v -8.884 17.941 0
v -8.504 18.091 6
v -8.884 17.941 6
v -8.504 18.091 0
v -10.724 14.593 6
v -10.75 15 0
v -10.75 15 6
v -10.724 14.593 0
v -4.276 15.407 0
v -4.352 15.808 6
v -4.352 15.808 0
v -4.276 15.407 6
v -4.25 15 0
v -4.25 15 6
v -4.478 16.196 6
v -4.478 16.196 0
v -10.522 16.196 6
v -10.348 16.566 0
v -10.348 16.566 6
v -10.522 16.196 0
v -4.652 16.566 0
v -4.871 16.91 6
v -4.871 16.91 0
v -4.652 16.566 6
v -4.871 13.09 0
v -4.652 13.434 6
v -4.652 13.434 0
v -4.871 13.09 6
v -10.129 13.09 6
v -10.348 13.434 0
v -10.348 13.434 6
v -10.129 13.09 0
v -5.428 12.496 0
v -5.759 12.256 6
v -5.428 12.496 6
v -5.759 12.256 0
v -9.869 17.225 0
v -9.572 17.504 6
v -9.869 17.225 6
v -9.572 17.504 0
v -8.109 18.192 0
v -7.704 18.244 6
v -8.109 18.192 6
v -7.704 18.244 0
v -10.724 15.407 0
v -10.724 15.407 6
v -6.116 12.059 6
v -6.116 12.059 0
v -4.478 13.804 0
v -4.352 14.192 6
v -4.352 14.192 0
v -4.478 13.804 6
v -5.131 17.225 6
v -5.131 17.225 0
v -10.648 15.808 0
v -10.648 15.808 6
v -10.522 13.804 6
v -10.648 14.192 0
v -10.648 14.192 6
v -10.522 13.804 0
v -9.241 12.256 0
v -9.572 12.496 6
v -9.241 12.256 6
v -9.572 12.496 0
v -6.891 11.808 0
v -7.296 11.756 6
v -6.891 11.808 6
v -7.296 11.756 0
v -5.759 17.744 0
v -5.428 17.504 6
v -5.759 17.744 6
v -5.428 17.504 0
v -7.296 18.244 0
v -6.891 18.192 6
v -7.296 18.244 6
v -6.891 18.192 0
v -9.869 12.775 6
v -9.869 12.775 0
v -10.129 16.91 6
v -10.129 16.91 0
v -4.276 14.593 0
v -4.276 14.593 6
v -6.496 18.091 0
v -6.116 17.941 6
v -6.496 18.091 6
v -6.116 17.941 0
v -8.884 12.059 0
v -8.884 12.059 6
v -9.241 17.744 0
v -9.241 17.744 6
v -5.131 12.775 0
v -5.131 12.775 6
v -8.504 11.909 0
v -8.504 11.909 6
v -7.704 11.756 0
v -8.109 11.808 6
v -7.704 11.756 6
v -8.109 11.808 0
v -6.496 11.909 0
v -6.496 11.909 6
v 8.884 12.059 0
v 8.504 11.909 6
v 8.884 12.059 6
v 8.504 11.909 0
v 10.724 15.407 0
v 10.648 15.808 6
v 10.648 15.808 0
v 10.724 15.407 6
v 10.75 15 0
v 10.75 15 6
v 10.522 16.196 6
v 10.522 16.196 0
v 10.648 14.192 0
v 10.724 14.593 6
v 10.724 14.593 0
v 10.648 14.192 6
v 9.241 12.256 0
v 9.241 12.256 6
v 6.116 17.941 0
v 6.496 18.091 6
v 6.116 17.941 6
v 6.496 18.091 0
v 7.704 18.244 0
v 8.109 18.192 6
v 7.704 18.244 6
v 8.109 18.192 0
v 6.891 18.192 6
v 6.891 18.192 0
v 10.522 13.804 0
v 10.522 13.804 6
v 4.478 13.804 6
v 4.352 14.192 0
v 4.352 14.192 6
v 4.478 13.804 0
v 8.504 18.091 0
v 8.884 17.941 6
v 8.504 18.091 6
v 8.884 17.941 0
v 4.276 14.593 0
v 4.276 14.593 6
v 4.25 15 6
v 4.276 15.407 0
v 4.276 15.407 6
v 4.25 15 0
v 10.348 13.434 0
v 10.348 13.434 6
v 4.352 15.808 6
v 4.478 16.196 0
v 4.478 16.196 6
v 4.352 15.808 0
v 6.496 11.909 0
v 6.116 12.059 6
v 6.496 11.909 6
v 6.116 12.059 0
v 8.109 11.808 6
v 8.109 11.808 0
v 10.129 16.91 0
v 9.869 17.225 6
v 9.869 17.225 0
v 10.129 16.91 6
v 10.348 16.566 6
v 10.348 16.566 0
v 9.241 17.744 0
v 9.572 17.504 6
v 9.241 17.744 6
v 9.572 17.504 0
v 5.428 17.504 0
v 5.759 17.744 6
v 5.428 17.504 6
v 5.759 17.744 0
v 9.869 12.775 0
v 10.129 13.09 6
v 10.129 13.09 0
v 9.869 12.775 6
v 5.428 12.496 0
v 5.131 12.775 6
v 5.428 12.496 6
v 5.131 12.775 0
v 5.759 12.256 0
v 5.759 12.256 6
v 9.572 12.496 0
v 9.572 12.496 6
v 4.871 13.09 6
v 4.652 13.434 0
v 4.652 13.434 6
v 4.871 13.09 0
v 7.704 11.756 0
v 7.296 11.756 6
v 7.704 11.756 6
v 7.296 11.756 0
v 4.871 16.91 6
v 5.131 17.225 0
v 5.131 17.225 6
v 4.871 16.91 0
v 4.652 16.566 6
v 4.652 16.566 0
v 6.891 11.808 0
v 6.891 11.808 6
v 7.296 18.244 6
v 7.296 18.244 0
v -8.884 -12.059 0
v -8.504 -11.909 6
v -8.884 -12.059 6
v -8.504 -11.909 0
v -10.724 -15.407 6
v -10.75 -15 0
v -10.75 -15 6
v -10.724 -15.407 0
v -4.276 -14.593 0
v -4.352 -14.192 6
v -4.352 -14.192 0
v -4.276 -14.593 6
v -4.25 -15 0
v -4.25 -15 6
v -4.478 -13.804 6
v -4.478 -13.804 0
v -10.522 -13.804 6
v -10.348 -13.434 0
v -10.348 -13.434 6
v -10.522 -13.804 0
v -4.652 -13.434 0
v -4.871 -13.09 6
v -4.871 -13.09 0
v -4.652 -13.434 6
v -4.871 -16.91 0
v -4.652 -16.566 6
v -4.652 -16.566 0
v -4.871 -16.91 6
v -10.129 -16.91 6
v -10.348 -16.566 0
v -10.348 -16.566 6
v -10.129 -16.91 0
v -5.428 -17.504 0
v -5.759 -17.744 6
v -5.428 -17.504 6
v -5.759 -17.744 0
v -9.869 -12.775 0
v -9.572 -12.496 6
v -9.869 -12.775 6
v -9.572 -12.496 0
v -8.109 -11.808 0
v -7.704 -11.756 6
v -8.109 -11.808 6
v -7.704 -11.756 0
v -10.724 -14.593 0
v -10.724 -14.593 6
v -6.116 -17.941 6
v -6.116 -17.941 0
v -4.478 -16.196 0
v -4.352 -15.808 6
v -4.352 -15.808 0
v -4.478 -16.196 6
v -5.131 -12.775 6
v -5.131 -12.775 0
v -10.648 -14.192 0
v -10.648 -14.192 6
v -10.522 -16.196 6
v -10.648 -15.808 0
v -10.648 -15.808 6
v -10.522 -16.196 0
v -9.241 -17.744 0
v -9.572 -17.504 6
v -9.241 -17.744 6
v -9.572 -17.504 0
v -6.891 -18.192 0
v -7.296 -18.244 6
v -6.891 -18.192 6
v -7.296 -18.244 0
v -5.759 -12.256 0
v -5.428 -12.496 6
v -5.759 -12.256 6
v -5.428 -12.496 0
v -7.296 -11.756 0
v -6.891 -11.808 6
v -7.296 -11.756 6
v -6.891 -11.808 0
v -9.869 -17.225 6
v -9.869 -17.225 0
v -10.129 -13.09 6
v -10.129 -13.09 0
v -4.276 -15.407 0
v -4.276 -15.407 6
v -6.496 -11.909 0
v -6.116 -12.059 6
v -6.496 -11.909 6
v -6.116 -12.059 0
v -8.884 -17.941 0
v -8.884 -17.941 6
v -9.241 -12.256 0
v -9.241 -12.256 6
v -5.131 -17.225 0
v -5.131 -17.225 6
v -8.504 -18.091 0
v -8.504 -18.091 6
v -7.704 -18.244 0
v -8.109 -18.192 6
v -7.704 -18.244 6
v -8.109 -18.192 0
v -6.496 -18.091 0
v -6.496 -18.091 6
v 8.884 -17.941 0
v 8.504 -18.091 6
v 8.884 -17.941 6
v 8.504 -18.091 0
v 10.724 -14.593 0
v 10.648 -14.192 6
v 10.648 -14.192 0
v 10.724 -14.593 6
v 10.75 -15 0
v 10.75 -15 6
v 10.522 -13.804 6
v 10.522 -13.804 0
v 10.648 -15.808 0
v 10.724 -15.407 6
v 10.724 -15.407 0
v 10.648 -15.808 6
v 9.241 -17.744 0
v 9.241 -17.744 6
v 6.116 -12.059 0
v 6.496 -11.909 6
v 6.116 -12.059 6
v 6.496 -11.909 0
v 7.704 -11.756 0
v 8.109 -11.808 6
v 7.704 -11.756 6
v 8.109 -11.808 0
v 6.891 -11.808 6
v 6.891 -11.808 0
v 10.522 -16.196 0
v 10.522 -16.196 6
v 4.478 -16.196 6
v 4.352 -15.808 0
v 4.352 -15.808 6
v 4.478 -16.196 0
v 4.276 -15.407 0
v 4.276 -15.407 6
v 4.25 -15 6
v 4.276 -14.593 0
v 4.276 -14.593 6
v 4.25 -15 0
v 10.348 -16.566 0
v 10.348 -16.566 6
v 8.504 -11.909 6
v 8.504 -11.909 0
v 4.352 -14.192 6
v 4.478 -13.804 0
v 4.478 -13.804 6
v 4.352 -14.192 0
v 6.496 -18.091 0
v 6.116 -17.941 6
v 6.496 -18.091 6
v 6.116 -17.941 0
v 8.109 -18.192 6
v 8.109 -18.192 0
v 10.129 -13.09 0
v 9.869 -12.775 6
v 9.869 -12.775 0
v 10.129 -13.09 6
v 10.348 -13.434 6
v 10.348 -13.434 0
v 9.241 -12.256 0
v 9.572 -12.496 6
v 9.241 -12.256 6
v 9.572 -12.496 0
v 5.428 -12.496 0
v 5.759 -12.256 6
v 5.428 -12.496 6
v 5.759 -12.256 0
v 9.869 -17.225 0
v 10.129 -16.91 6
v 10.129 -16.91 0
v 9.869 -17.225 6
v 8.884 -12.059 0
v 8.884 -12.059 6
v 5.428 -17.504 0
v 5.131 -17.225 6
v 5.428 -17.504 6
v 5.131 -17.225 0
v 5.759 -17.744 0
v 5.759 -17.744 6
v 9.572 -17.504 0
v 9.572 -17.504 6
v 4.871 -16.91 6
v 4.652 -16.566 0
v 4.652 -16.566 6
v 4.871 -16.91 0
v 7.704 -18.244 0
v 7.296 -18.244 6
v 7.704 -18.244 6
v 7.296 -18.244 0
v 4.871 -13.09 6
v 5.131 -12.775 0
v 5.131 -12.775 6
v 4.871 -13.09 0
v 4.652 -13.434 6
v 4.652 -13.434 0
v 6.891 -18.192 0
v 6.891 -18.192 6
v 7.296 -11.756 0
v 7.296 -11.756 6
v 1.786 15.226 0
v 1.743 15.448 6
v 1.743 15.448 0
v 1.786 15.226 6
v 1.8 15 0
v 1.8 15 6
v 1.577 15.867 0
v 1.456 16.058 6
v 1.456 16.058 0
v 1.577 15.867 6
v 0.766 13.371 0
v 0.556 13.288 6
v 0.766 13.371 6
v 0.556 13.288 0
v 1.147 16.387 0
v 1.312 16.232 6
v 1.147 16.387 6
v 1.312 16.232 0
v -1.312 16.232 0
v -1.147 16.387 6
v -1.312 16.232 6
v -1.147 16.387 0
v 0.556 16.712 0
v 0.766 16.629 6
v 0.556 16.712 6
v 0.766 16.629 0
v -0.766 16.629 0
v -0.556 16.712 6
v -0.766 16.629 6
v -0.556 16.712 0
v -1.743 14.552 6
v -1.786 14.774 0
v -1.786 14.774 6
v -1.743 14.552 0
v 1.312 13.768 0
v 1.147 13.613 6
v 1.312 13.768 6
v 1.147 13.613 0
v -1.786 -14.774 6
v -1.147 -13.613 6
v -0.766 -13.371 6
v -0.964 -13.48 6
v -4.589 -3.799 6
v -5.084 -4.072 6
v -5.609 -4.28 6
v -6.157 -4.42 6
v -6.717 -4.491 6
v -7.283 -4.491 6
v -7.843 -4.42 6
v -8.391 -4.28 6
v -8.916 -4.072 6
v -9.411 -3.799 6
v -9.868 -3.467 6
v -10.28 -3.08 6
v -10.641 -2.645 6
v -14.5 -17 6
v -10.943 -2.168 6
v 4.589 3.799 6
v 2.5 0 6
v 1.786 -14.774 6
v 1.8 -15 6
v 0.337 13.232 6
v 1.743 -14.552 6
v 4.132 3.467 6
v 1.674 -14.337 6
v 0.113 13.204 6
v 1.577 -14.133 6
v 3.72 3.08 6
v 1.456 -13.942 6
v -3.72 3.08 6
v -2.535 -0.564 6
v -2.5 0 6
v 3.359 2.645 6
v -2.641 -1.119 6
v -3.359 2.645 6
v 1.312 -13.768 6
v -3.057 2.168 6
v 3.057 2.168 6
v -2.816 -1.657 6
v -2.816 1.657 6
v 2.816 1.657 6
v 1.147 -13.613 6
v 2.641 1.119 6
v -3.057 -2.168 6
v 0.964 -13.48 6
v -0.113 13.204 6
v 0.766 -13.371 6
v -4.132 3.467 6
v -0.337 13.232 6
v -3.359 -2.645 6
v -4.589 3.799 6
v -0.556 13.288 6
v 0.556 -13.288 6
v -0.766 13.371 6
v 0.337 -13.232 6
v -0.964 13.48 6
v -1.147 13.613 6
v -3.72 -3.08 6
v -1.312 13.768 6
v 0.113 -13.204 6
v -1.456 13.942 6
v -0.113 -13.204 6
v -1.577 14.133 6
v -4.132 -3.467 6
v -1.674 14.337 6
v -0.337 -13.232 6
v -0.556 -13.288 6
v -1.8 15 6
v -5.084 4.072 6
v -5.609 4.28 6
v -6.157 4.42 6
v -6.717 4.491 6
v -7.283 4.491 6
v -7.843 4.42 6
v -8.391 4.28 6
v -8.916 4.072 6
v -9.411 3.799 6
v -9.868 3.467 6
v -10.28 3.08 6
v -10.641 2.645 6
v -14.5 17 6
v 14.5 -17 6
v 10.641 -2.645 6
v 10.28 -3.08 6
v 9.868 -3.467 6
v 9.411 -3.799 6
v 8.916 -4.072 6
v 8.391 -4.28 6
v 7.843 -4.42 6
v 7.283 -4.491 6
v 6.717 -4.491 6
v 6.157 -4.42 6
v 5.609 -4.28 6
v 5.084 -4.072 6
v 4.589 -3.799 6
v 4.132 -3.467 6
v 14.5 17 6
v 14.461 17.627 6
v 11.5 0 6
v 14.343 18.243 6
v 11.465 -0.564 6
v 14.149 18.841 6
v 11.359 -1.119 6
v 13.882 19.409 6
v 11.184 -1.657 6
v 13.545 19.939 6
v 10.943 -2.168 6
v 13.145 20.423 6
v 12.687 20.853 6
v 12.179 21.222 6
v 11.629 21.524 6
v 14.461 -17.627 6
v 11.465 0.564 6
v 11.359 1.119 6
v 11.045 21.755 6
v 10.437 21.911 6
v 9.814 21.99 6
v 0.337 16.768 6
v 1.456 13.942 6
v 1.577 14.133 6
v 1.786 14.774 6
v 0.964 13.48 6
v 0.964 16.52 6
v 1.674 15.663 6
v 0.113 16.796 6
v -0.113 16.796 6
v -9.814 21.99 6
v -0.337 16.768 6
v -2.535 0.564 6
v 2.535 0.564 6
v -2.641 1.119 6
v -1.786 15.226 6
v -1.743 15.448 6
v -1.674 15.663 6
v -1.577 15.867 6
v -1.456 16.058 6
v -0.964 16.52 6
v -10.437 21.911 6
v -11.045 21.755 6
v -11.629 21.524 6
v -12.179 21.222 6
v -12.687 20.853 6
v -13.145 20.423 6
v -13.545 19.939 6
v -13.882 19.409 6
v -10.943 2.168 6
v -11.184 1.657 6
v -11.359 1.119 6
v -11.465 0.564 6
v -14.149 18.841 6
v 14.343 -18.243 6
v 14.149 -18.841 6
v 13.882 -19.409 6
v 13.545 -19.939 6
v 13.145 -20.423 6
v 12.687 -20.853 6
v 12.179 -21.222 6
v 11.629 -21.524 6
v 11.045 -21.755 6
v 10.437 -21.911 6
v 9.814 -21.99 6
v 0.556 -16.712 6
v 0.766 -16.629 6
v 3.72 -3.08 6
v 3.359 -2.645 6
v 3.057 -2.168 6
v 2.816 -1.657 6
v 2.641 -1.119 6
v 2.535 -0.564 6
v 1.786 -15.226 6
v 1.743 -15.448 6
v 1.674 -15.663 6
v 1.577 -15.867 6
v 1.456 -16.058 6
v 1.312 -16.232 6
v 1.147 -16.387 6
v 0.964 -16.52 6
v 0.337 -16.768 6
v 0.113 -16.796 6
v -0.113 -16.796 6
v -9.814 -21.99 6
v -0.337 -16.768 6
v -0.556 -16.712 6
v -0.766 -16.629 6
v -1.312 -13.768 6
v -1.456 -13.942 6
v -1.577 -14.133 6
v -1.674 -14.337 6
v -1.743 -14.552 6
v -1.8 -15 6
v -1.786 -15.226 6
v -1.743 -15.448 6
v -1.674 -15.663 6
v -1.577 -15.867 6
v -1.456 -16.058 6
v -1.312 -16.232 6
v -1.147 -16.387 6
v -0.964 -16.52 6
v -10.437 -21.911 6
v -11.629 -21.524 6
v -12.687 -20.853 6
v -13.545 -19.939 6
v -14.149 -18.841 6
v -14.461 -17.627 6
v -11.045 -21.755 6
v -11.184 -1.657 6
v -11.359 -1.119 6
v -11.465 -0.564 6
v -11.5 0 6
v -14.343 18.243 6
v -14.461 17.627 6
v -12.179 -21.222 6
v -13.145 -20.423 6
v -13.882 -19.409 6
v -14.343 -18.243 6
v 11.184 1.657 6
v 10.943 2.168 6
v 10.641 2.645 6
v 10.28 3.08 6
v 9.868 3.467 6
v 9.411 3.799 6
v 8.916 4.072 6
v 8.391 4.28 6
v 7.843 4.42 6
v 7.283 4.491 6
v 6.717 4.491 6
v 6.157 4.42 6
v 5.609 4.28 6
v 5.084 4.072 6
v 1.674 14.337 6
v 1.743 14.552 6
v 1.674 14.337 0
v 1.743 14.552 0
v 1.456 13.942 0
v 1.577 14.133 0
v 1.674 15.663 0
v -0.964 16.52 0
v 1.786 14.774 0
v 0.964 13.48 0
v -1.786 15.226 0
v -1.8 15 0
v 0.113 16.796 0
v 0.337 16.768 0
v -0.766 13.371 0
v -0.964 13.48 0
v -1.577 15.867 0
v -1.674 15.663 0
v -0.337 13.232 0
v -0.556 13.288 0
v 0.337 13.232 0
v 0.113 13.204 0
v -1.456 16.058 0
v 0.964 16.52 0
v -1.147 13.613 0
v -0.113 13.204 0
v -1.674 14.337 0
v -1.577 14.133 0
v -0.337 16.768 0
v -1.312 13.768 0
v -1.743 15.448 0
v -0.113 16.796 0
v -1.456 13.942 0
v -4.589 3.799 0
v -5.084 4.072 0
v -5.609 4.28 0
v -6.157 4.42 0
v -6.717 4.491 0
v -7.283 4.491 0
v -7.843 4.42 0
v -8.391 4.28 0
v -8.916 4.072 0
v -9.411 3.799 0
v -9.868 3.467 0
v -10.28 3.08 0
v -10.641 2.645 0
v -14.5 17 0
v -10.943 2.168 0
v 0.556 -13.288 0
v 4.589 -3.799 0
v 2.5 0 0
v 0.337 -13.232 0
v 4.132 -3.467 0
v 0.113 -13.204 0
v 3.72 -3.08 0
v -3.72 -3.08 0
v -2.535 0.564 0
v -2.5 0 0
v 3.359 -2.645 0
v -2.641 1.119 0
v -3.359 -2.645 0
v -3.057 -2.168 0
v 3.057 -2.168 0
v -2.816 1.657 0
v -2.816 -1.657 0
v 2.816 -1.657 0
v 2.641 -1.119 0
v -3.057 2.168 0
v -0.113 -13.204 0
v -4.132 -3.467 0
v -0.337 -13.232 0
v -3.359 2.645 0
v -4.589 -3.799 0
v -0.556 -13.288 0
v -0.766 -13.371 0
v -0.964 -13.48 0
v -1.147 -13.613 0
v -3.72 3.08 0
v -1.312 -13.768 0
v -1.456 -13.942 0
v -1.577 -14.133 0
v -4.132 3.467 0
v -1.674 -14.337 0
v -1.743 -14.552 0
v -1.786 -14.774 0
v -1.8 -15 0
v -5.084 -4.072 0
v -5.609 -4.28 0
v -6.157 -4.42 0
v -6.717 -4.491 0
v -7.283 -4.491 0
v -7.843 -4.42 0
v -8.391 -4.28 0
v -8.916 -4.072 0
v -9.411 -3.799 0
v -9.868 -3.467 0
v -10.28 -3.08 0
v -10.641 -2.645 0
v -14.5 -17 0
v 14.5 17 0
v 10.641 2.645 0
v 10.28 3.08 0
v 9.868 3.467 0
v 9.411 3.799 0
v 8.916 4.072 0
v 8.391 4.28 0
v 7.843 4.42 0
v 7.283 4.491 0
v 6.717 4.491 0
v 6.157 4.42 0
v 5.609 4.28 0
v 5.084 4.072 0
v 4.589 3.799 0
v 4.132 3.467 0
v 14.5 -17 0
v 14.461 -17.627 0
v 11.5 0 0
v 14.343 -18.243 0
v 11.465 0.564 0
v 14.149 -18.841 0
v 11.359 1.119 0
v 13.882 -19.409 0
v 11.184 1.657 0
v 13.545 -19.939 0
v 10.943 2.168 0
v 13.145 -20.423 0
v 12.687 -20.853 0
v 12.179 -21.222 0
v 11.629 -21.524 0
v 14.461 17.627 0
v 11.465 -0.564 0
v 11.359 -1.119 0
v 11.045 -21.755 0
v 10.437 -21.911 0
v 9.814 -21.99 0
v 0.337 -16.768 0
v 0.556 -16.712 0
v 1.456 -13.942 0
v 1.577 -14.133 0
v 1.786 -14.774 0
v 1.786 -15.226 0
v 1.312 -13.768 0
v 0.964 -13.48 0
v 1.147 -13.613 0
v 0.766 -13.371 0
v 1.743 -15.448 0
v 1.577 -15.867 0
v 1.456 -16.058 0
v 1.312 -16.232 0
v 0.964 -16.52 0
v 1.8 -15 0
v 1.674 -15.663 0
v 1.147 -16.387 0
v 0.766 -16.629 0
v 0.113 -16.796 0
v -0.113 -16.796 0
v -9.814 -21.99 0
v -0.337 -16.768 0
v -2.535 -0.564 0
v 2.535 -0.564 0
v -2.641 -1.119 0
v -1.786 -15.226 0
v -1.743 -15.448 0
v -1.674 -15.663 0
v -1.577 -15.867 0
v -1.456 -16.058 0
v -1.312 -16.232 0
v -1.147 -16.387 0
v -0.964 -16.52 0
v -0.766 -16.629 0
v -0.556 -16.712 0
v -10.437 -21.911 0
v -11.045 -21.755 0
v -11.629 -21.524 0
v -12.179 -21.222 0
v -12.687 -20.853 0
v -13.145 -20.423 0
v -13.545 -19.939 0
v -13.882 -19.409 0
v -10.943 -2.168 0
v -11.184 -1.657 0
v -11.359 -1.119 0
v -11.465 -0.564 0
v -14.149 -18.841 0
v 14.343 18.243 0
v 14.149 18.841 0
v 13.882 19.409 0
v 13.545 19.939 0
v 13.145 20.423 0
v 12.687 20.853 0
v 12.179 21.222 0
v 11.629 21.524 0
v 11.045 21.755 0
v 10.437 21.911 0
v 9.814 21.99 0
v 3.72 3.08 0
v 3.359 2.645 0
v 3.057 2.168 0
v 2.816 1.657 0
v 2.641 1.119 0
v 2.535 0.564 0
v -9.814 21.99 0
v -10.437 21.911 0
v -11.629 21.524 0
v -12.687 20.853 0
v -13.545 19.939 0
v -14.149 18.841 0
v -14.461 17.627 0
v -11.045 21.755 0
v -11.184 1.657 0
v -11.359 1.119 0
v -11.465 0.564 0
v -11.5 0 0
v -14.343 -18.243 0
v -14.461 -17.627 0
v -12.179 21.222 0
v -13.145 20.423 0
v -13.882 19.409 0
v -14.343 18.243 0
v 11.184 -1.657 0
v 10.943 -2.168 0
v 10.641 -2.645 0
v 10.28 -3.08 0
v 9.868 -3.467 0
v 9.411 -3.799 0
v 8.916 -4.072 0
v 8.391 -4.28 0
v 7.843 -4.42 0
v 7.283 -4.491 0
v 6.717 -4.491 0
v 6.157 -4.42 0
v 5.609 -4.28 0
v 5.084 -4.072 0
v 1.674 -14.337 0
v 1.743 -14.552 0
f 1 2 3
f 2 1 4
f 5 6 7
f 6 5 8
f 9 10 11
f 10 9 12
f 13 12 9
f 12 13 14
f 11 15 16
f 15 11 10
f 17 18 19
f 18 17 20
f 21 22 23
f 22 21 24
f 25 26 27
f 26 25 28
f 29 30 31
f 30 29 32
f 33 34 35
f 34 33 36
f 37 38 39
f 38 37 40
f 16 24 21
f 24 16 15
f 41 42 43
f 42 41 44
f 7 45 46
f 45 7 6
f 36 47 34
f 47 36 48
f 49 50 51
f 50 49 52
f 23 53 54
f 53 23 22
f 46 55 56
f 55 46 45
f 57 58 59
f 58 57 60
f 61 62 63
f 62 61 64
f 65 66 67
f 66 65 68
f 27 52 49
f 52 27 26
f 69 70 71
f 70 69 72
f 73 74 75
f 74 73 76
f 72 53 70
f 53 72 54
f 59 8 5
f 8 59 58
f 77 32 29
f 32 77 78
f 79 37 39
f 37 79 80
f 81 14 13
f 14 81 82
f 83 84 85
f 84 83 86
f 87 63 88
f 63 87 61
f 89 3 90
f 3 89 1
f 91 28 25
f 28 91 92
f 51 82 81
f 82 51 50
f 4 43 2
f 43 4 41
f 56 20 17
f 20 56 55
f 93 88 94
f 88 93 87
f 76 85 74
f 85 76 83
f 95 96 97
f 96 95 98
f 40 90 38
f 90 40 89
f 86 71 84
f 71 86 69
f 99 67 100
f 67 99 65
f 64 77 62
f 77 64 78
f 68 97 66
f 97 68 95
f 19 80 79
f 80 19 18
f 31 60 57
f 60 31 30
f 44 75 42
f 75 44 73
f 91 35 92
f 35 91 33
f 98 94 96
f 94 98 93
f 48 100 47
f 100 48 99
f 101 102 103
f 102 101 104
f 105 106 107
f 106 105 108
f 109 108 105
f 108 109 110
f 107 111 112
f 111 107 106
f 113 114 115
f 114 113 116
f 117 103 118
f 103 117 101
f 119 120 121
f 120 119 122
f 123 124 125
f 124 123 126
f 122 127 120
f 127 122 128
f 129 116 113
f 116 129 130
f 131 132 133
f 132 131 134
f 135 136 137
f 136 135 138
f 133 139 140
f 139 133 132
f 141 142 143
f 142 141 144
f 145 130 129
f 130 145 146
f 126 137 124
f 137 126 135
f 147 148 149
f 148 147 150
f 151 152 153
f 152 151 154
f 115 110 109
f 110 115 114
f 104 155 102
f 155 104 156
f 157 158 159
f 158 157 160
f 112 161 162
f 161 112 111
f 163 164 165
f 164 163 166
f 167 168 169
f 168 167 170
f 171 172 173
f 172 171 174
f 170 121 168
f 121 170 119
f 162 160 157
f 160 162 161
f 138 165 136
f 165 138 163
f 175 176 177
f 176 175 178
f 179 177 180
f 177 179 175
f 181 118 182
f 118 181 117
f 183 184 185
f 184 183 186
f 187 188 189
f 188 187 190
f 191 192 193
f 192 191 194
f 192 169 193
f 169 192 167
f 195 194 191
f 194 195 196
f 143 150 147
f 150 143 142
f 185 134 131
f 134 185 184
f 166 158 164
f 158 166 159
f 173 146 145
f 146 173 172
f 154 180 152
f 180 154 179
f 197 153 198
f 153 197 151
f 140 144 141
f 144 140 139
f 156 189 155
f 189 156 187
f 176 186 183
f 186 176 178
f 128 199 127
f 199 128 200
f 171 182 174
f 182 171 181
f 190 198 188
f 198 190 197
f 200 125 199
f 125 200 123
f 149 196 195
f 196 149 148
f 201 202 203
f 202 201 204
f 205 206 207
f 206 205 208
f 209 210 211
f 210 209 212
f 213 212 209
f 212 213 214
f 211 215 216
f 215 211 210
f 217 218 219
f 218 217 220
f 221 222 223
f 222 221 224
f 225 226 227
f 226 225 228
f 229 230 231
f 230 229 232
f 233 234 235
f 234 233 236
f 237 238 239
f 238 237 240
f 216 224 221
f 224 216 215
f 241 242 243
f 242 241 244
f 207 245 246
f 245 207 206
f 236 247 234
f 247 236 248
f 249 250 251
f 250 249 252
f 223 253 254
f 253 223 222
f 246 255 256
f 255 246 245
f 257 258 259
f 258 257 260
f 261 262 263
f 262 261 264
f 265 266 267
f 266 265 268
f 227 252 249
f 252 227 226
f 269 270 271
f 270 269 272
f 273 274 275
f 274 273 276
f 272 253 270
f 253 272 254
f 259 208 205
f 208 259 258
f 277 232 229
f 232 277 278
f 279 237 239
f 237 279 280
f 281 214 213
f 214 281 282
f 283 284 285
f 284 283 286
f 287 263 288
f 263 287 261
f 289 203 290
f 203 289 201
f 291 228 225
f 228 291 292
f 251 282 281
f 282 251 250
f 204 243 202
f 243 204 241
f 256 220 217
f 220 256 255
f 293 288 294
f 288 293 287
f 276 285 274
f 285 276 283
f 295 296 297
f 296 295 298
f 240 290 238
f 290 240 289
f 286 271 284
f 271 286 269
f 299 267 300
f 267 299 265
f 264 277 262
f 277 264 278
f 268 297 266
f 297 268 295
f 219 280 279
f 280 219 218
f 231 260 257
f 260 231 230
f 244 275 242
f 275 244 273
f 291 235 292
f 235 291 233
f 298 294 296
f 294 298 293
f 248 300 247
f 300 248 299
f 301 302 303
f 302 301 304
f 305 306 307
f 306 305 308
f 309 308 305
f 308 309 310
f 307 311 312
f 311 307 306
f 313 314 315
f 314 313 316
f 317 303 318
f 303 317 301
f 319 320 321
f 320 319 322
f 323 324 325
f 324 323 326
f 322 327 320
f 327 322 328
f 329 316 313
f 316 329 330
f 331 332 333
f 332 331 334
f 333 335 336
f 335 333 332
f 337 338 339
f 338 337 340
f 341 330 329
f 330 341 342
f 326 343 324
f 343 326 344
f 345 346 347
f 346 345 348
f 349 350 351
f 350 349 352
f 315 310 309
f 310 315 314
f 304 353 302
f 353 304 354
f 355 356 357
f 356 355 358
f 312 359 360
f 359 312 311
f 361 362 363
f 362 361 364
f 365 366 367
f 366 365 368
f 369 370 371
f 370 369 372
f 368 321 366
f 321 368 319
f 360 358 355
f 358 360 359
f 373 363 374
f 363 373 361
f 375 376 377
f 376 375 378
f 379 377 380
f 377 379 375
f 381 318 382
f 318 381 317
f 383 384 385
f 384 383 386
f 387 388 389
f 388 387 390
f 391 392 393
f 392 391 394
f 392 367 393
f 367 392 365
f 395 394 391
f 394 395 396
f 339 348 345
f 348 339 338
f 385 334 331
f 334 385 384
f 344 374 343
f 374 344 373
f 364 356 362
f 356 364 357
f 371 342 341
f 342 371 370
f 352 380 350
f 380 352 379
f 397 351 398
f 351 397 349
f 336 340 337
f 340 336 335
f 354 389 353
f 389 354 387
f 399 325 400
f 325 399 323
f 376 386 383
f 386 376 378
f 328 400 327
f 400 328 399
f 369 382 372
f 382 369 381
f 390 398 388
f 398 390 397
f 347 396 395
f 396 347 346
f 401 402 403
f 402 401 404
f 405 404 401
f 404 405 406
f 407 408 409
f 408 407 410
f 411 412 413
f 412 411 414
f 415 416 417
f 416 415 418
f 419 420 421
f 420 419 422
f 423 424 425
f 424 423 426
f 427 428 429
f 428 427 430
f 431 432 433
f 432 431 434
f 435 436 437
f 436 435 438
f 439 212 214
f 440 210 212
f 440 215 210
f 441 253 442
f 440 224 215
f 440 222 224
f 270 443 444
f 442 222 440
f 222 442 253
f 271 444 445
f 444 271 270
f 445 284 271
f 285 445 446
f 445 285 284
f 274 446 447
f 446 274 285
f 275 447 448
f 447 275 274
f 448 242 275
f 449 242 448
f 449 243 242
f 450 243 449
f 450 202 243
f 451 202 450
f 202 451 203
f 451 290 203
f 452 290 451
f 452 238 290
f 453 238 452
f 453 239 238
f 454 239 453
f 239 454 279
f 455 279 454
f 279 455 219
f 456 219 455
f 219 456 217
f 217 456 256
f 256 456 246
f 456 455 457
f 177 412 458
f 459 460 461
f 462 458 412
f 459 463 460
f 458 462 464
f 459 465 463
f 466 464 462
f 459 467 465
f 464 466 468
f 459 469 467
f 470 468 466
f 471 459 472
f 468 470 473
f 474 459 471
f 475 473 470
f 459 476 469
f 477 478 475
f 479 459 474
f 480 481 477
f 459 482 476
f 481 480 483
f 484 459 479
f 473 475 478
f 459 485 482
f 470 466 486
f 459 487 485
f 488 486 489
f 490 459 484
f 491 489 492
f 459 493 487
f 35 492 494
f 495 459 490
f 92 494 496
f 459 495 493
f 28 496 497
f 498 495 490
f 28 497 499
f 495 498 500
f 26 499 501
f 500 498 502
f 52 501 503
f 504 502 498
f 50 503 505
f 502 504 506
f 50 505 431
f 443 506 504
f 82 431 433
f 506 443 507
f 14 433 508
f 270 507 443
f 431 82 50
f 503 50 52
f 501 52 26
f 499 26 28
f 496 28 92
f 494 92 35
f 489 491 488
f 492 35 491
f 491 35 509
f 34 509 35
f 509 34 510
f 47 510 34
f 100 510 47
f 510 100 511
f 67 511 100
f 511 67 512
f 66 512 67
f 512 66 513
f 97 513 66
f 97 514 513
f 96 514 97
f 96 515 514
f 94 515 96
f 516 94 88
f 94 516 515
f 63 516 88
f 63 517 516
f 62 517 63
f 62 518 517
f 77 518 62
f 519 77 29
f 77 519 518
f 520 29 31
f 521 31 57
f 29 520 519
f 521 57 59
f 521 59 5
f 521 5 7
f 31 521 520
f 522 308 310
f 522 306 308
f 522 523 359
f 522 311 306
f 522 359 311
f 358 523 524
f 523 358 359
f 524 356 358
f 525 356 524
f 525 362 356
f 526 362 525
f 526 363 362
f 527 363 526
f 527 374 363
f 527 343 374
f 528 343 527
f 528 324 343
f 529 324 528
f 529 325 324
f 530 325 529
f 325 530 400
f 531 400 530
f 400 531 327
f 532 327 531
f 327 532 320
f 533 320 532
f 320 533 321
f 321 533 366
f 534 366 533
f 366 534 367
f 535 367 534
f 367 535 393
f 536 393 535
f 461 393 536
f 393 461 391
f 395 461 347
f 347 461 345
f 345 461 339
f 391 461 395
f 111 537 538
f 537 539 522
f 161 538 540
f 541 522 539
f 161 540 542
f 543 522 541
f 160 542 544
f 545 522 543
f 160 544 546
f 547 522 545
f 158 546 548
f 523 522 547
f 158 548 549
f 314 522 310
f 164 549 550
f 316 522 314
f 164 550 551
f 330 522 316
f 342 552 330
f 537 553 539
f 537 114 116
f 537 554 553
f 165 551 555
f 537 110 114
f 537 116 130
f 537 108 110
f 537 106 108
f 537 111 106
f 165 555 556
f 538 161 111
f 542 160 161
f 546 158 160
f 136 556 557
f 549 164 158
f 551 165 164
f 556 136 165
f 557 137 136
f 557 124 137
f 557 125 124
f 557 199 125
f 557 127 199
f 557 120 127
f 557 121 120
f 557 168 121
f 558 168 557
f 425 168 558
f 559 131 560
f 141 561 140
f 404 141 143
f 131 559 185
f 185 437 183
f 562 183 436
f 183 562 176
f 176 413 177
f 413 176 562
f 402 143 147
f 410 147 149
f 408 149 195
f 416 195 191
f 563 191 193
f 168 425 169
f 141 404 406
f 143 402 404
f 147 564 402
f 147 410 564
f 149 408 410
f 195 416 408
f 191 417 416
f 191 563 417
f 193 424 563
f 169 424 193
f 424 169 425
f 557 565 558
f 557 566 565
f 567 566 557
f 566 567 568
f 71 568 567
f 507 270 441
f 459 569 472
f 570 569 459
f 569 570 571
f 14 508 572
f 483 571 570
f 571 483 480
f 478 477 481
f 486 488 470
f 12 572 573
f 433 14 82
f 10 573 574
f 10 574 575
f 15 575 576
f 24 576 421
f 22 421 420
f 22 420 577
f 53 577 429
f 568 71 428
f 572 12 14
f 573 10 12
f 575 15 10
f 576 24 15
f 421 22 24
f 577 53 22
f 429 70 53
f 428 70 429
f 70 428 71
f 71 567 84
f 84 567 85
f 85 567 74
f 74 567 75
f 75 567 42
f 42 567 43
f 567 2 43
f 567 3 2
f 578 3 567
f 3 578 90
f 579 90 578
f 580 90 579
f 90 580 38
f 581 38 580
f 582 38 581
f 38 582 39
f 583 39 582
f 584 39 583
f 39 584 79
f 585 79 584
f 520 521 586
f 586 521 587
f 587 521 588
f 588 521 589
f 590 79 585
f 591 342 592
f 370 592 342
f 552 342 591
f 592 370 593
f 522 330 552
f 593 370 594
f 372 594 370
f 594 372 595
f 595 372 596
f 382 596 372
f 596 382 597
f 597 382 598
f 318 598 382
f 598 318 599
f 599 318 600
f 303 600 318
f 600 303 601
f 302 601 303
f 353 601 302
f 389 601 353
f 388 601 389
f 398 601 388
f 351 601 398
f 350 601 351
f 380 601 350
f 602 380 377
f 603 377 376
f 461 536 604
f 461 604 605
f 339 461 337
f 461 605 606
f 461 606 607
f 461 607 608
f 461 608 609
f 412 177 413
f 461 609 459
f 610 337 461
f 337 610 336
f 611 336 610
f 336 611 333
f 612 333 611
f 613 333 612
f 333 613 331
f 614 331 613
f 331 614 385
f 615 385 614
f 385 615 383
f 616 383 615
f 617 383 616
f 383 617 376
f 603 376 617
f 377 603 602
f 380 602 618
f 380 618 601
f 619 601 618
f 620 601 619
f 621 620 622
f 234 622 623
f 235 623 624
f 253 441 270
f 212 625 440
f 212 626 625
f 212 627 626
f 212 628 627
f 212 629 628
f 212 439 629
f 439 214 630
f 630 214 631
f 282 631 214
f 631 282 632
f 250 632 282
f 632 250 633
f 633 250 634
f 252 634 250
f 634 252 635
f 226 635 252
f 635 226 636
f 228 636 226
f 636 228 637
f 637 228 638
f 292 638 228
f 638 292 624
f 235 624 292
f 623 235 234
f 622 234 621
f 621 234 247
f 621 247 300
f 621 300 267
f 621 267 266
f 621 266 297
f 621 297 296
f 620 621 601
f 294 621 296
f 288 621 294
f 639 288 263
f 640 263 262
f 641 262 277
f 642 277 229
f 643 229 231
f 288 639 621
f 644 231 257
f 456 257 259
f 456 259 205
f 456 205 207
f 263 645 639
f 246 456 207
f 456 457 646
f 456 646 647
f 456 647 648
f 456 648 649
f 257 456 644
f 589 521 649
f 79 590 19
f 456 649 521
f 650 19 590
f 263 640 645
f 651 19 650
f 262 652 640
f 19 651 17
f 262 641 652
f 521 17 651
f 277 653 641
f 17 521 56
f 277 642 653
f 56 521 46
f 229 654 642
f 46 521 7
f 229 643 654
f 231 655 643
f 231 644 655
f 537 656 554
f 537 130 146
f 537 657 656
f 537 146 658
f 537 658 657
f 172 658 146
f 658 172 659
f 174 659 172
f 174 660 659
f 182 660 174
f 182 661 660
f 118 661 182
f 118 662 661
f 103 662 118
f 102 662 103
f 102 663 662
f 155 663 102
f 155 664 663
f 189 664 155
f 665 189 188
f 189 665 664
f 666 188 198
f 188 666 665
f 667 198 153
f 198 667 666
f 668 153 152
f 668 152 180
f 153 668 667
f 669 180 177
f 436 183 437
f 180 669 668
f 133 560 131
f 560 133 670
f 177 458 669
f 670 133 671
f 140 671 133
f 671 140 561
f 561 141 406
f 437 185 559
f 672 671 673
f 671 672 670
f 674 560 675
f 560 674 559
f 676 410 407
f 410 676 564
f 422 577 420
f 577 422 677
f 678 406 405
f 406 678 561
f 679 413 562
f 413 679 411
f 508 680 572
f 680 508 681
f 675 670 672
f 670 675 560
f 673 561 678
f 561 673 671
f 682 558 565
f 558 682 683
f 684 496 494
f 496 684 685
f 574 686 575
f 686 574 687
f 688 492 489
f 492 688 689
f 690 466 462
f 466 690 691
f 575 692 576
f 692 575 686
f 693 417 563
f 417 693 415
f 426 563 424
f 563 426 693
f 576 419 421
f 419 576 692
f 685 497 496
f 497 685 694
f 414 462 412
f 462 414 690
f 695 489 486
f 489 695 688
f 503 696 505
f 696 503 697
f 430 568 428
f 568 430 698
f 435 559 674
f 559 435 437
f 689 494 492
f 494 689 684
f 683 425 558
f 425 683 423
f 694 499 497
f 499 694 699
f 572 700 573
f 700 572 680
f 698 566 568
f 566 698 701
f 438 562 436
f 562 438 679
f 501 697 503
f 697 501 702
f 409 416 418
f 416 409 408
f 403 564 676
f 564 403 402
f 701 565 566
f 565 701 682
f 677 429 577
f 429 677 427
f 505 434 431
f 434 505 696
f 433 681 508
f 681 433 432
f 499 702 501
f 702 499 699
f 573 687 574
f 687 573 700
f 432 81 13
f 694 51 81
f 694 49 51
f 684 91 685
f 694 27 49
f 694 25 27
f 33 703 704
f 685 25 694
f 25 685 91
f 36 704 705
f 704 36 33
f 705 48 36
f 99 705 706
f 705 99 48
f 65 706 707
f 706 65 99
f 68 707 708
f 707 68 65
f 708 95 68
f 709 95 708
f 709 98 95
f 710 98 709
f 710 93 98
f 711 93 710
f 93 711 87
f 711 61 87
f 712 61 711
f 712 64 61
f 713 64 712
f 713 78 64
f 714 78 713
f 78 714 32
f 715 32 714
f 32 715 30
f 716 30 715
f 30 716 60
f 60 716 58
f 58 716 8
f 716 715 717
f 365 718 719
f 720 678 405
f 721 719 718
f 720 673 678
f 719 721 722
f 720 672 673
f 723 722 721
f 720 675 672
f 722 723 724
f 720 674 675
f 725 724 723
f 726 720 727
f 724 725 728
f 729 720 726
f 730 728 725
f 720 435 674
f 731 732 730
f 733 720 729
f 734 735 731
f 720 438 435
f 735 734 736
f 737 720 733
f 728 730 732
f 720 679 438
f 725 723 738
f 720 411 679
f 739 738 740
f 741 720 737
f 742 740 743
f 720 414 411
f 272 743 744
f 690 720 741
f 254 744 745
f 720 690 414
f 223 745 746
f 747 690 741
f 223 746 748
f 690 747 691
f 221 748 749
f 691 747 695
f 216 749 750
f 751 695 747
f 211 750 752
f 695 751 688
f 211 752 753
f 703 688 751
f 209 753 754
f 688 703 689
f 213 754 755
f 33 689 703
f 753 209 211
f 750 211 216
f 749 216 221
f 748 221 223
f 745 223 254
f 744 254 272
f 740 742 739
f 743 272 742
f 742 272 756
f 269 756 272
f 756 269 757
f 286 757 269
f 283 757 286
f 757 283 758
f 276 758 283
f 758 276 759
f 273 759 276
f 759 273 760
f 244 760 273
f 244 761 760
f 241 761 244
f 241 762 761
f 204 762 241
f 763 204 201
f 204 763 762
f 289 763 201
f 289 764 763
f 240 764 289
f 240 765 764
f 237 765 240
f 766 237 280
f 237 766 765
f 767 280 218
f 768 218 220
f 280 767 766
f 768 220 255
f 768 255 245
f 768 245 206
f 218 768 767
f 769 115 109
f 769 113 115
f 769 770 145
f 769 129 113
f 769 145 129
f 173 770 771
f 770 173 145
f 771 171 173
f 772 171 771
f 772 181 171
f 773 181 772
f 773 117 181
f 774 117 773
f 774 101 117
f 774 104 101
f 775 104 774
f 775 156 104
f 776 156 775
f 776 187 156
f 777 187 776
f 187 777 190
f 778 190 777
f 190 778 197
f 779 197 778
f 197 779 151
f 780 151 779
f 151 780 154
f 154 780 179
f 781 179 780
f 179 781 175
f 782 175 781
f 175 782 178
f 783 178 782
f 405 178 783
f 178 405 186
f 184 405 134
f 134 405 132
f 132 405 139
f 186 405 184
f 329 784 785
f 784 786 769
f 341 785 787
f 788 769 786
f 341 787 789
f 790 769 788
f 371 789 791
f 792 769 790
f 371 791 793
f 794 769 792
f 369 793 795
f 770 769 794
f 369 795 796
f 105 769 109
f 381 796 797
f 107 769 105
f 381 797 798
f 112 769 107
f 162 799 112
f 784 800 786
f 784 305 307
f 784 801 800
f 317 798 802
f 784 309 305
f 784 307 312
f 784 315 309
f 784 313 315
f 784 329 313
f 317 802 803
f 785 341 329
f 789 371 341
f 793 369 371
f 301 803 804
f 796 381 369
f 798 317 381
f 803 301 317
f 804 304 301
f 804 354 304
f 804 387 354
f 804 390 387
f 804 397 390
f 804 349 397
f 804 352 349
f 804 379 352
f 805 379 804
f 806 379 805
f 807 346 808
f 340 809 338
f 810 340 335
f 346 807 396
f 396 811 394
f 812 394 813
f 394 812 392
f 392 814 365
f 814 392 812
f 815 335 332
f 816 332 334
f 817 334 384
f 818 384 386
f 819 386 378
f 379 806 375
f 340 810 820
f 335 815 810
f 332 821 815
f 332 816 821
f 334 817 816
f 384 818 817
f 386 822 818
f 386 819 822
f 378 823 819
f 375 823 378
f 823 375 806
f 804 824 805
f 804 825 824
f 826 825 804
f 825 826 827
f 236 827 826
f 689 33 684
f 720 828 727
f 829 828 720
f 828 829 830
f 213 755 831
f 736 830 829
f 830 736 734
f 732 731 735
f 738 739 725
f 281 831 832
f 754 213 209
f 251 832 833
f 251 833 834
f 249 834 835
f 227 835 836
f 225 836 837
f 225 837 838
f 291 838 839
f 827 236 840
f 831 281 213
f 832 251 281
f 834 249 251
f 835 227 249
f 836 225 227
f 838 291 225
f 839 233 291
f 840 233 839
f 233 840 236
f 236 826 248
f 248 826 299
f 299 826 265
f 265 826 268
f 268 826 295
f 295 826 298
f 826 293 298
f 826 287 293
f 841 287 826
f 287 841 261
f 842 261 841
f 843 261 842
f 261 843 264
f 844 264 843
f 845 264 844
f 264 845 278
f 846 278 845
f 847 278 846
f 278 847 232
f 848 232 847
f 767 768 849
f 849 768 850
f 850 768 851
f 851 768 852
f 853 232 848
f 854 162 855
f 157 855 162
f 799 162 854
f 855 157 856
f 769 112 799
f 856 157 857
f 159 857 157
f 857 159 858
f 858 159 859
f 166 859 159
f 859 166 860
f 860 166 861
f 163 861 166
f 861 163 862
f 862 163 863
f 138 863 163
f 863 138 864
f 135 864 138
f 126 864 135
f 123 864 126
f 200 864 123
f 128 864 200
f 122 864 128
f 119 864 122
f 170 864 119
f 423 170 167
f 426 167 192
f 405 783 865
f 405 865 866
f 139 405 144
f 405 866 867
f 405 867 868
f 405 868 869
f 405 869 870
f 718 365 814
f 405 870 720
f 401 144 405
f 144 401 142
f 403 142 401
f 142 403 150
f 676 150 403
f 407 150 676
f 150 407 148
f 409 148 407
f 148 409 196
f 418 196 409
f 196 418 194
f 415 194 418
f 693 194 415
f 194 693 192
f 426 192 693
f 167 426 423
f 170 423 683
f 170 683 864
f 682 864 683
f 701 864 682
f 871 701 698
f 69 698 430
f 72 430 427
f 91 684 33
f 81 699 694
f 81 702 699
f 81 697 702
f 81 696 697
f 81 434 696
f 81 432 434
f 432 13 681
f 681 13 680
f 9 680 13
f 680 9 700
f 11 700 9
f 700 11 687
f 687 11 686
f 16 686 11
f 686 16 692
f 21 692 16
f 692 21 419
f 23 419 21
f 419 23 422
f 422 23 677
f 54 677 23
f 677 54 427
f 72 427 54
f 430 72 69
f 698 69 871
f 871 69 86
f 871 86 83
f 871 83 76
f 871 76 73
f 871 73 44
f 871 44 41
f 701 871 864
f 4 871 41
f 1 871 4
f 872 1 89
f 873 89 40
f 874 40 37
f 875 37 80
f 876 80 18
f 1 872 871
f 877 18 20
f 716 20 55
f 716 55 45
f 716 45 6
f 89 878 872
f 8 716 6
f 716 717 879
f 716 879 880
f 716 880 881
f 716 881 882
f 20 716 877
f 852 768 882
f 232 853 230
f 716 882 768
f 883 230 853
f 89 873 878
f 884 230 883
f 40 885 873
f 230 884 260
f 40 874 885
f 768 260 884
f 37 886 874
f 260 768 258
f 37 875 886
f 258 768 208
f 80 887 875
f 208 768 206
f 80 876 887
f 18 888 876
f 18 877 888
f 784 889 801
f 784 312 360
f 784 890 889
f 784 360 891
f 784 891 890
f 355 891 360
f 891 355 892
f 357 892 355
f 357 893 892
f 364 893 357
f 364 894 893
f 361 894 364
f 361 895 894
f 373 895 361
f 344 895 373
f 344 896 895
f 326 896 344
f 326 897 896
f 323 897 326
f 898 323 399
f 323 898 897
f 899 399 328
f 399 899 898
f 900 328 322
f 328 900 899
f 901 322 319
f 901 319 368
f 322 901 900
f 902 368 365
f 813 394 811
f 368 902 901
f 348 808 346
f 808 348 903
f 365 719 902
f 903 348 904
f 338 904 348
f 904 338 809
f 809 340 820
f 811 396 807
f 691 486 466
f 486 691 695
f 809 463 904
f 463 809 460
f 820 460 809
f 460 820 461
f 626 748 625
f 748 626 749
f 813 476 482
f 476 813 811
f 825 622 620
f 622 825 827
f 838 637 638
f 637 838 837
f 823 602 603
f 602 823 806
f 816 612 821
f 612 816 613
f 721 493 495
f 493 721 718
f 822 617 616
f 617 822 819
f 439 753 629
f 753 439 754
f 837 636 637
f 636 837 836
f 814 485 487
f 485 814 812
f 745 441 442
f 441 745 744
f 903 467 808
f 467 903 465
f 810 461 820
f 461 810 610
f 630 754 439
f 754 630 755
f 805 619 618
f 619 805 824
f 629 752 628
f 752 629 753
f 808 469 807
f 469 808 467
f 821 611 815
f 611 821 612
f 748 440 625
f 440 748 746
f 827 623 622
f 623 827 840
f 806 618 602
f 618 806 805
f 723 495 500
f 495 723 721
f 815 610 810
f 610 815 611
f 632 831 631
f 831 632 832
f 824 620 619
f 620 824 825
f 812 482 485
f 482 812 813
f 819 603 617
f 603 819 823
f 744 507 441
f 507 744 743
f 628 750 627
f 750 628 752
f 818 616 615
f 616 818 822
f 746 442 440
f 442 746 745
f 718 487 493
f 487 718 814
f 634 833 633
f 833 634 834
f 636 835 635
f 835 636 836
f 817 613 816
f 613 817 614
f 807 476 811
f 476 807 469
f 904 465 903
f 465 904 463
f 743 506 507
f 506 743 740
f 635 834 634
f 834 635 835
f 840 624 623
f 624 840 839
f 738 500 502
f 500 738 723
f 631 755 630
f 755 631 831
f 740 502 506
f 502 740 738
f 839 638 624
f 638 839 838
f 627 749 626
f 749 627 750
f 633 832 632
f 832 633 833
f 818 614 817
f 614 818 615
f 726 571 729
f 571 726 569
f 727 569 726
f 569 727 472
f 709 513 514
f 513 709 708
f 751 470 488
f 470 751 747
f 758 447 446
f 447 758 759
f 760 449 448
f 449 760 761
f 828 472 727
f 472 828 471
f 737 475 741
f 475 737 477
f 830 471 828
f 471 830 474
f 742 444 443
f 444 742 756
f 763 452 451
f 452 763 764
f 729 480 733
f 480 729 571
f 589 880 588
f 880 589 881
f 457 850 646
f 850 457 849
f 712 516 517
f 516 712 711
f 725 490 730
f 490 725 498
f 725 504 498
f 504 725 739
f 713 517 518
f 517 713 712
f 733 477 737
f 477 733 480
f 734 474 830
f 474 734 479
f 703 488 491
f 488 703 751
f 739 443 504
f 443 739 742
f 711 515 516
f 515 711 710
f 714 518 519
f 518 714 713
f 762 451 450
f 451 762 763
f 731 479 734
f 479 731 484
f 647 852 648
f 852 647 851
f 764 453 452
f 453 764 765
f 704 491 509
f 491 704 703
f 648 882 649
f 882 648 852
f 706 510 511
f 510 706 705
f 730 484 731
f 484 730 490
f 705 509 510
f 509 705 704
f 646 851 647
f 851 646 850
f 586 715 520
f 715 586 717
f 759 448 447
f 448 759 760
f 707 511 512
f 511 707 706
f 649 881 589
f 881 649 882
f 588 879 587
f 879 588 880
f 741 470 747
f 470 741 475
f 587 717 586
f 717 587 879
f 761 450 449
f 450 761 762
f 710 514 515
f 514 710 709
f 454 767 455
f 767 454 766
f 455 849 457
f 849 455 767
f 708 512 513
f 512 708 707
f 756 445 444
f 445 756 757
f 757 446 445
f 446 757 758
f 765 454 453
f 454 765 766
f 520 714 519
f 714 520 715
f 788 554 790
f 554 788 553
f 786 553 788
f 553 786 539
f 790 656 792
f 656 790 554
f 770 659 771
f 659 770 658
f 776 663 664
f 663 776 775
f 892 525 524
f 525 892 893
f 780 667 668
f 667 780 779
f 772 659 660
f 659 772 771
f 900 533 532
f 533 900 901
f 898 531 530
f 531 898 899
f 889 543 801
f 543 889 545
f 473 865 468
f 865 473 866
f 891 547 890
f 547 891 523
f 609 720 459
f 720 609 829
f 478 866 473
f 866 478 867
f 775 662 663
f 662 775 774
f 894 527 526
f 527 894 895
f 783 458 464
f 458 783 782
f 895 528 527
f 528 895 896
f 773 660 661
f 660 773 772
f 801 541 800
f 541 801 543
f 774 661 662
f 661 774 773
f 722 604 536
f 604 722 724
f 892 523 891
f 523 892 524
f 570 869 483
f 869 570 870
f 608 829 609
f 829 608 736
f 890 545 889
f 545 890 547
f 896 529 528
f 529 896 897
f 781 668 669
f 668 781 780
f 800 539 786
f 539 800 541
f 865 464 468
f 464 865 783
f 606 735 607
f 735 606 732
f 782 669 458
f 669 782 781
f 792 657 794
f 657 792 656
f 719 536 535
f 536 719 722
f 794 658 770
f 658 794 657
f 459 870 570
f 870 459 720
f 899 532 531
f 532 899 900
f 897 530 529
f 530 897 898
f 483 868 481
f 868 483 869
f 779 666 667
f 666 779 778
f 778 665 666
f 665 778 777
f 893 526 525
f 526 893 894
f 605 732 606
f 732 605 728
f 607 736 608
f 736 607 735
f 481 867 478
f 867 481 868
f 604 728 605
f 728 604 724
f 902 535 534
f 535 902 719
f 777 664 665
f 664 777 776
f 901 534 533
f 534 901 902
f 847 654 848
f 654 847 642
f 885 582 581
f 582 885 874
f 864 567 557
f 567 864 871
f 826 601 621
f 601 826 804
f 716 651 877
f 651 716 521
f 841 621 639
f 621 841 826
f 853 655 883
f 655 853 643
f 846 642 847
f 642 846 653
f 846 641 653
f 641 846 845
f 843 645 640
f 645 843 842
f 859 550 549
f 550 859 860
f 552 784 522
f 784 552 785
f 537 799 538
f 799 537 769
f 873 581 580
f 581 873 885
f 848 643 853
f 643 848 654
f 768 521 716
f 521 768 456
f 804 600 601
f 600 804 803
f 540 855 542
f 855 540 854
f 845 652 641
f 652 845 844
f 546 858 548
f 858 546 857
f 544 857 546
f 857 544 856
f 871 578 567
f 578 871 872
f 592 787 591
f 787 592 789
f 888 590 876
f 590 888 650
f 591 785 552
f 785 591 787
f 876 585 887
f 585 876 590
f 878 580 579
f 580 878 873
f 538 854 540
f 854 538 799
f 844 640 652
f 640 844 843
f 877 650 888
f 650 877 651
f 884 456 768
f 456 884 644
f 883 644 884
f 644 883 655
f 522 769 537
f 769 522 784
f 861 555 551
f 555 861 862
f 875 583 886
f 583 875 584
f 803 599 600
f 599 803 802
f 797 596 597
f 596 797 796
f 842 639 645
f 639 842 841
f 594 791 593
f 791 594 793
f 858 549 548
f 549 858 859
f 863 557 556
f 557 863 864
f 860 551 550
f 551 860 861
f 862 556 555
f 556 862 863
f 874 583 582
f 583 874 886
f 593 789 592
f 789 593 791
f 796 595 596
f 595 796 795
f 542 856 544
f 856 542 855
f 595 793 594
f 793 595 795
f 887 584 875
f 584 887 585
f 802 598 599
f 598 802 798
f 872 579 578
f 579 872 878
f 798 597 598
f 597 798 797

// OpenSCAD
$fn = 50;


difference() {
	union() {
		hull() {
			translate(v = [-9.5000000000, 17.0000000000, 0]) {
				cylinder(h = 6, r = 5);
			}
			translate(v = [9.5000000000, 17.0000000000, 0]) {
				cylinder(h = 6, r = 5);
			}
			translate(v = [-9.5000000000, -17.0000000000, 0]) {
				cylinder(h = 6, r = 5);
			}
			translate(v = [9.5000000000, -17.0000000000, 0]) {
				cylinder(h = 6, r = 5);
			}
		}
	}
	union() {
		#translate(v = [-7.5000000000, 15.0000000000, 0]) {
			cylinder(h = 6, r = 3.2500000000);
		}
		#translate(v = [7.5000000000, 15.0000000000, 0]) {
			cylinder(h = 6, r = 3.2500000000);
		}
		#translate(v = [-7.5000000000, -15.0000000000, 0]) {
			cylinder(h = 6, r = 3.2500000000);
		}
		#translate(v = [7.5000000000, -15.0000000000, 0]) {
			cylinder(h = 6, r = 3.2500000000);
		}
		#translate(v = [-7.5000000000, -15.0000000000, -100.0000000000]) {
			cylinder(h = 200, r = 3.2500000000);
		}
		#translate(v = [-7.5000000000, 15.0000000000, -100.0000000000]) {
			cylinder(h = 200, r = 3.2500000000);
		}
		#translate(v = [7.5000000000, -15.0000000000, -100.0000000000]) {
			cylinder(h = 200, r = 3.2500000000);
		}
		#translate(v = [7.5000000000, 15.0000000000, -100.0000000000]) {
			cylinder(h = 200, r = 3.2500000000);
		}
		#translate(v = [-7.5000000000, 15.0000000000, 0]) {
			cylinder(h = 6, r = 1.8000000000);
		}
		#translate(v = [0.0000000000, 15.0000000000, 0]) {
			cylinder(h = 6, r = 1.8000000000);
		}
		#translate(v = [7.5000000000, 15.0000000000, 0]) {
			cylinder(h = 6, r = 1.8000000000);
		}
		#translate(v = [-7.5000000000, -15.0000000000, 0]) {
			cylinder(h = 6, r = 1.8000000000);
		}
		#translate(v = [0.0000000000, -15.0000000000, 0]) {
			cylinder(h = 6, r = 1.8000000000);
		}
		#translate(v = [7.5000000000, -15.0000000000, 0]) {
			cylinder(h = 6, r = 1.8000000000);
		}
		#translate(v = [-7.5000000000, 15.0000000000, 0]) {
			cylinder(h = 6, r = 1.8000000000);
		}
		#translate(v = [0.0000000000, 15.0000000000, 0]) {
			cylinder(h = 6, r = 1.8000000000);
		}
		#translate(v = [7.5000000000, 15.0000000000, 0]) {
			cylinder(h = 6, r = 1.8000000000);
		}
		#translate(v = [-7.5000000000, -15.0000000000, 0]) {
			cylinder(h = 6, r = 1.8000000000);
		}
		#translate(v = [0.0000000000, -15.0000000000, 0]) {
			cylinder(h = 6, r = 1.8000000000);
		}
		#translate(v = [7.5000000000, -15.0000000000, 0]) {
			cylinder(h = 6, r = 1.8000000000);
		}
		#translate(v = [-7.5000000000, 15.0000000000, 0]) {
			cylinder(h = 6, r = 1.8000000000);
		}
		#translate(v = [0.0000000000, 15.0000000000, 0]) {
			cylinder(h = 6, r = 1.8000000000);
		}
		#translate(v = [7.5000000000, 15.0000000000, 0]) {
			cylinder(h = 6, r = 1.8000000000);
		}
		#translate(v = [-7.5000000000, -15.0000000000, 0]) {
			cylinder(h = 6, r = 1.8000000000);
		}
		#translate(v = [0.0000000000, -15.0000000000, 0]) {
			cylinder(h = 6, r = 1.8000000000);
		}
		#translate(v = [7.5000000000, -15.0000000000, 0]) {
			cylinder(h = 6, r = 1.8000000000);
		}
		#translate(v = [-7.0000000000, 0, 0]) {
			cylinder(h = 6, r = 4.5000000000);
		}
		#translate(v = [7.0000000000, 0, 0]) {
			cylinder(h = 6, r = 4.5000000000);
		}
	}
}
